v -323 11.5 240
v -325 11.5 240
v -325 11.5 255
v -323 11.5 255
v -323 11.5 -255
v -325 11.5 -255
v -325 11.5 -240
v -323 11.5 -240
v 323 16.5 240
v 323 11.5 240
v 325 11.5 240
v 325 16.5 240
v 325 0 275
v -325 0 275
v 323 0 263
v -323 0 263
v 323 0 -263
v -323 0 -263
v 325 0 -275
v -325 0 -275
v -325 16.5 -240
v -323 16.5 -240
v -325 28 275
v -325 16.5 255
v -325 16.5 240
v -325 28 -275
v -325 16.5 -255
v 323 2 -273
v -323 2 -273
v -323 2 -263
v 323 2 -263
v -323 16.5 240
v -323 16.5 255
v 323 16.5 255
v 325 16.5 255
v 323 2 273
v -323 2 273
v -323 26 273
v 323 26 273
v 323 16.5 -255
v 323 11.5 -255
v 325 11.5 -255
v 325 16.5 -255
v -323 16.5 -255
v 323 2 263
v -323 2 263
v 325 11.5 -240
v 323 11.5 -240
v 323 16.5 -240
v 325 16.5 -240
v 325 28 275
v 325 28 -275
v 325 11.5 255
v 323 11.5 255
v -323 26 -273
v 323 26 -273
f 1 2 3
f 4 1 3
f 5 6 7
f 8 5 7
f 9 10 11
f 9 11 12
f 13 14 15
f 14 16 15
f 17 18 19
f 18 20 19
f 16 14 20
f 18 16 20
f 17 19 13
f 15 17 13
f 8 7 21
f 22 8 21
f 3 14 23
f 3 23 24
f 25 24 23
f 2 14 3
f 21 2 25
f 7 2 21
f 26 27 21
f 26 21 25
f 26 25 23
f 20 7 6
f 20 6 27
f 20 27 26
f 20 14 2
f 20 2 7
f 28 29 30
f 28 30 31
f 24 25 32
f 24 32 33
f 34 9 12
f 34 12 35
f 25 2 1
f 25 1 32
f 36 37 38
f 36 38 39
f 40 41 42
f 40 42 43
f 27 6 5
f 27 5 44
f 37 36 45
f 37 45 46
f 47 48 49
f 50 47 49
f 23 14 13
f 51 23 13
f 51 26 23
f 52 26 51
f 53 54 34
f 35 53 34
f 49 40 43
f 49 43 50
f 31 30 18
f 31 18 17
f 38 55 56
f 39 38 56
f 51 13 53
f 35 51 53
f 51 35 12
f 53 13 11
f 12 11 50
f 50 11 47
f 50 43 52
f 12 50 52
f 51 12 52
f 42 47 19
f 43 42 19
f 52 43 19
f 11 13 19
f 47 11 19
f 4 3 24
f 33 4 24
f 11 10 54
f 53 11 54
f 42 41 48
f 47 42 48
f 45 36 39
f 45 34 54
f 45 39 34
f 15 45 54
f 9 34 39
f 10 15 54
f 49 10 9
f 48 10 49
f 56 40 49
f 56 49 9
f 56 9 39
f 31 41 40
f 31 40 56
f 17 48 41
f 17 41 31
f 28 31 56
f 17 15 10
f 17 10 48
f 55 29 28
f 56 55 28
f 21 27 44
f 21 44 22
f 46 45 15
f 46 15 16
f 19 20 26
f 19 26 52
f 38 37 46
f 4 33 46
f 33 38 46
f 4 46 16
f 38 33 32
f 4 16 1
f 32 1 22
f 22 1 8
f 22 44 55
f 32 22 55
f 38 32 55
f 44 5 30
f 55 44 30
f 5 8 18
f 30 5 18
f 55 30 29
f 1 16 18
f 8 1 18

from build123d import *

# Parameters (mm, degrees)
CROQUIS1_W              = 650
CROQUIS1_H              = 550
SALIENTE_EXTRUIR1_DEPTH = 28
VACIADO1_T              = -2
CROQUIS2_W              = 646
CROQUIS2_H              = 2
SALIENTE_EXTRUIR2_DEPTH = 10
CROQUIS3_W              = 646
CROQUIS3_H              = 2
SALIENTE_EXTRUIR3_DEPTH = 10
CORTAR_EXTRUIR1_REACH   = 708.335
CROQUIS4_W              = 15
CROQUIS4_H              = 5


with BuildPart() as part:
    # Croquis1 → Saliente-Extruir1 (new body)
    with BuildSketch(Plane(origin=(0, 0, 0), x_dir=(1, 0, 0), z_dir=(0, 1, 0))):
        Rectangle(CROQUIS1_W, CROQUIS1_H)
    extrude(amount=SALIENTE_EXTRUIR1_DEPTH)

    # Vaciado1
    vaciado1_openings = [part.faces().sort_by_distance(p)[0] for p in [
        (0, 0, 0),
    ]]
    offset(amount=VACIADO1_T, openings=vaciado1_openings, kind=Kind.INTERSECTION)

    # Croquis2 → Saliente-Extruir2 (add)
    with BuildSketch(Plane(origin=(0, 0, 273), x_dir=(-1, 0, 0), z_dir=(0, 0, -1))):
        with Locations((0, 1)):
            Rectangle(CROQUIS2_W, CROQUIS2_H)
    extrude(amount=SALIENTE_EXTRUIR2_DEPTH)

    # Croquis3 → Saliente-Extruir3 (add)
    with BuildSketch(Plane.XY.offset(-273)):
        with Locations((0, 1)):
            Rectangle(CROQUIS3_W, CROQUIS3_H)
    extrude(amount=SALIENTE_EXTRUIR3_DEPTH)

    # Cortar-Extruir1: up to this face of the body (flat: up to its plane)
    cortar_extruir1_end = Plane(part.part.faces().sort_by_distance((325, 14, 0))[0])
    # Croquis4 → Cortar-Extruir1 (cut, up to the picked face)
    with BuildSketch(Plane.ZY.offset(325), mode=Mode.PRIVATE) as cortar_extruir1_sk1:
        with Locations((-247.5, 14)):
            Rectangle(CROQUIS4_W, CROQUIS4_H)
    cortar_extruir1_tool1 = split(extrude(cortar_extruir1_sk1.sketch, amount=-CORTAR_EXTRUIR1_REACH, mode=Mode.PRIVATE), bisect_by=cortar_extruir1_end, keep=Keep.BOTH, mode=Mode.PRIVATE)
    # Croquis4 → Cortar-Extruir1 (cut, up to the picked face)
    with BuildSketch(Plane.ZY.offset(325), mode=Mode.PRIVATE) as cortar_extruir1_sk2:
        with Locations((247.5, 14)):
            Rectangle(CROQUIS4_W, CROQUIS4_H)
    cortar_extruir1_tool2 = split(extrude(cortar_extruir1_sk2.sketch, amount=-CORTAR_EXTRUIR1_REACH, mode=Mode.PRIVATE), bisect_by=cortar_extruir1_end, keep=Keep.BOTH, mode=Mode.PRIVATE)
    add(cortar_extruir1_tool1.solids().sort_by(Axis((-325, 14, -247.5), (1, 0, 0)))[0], mode=Mode.SUBTRACT)
    add(cortar_extruir1_tool2.solids().sort_by(Axis((-325, 14, 247.5), (1, 0, 0)))[0], mode=Mode.SUBTRACT)


solid = part.part
